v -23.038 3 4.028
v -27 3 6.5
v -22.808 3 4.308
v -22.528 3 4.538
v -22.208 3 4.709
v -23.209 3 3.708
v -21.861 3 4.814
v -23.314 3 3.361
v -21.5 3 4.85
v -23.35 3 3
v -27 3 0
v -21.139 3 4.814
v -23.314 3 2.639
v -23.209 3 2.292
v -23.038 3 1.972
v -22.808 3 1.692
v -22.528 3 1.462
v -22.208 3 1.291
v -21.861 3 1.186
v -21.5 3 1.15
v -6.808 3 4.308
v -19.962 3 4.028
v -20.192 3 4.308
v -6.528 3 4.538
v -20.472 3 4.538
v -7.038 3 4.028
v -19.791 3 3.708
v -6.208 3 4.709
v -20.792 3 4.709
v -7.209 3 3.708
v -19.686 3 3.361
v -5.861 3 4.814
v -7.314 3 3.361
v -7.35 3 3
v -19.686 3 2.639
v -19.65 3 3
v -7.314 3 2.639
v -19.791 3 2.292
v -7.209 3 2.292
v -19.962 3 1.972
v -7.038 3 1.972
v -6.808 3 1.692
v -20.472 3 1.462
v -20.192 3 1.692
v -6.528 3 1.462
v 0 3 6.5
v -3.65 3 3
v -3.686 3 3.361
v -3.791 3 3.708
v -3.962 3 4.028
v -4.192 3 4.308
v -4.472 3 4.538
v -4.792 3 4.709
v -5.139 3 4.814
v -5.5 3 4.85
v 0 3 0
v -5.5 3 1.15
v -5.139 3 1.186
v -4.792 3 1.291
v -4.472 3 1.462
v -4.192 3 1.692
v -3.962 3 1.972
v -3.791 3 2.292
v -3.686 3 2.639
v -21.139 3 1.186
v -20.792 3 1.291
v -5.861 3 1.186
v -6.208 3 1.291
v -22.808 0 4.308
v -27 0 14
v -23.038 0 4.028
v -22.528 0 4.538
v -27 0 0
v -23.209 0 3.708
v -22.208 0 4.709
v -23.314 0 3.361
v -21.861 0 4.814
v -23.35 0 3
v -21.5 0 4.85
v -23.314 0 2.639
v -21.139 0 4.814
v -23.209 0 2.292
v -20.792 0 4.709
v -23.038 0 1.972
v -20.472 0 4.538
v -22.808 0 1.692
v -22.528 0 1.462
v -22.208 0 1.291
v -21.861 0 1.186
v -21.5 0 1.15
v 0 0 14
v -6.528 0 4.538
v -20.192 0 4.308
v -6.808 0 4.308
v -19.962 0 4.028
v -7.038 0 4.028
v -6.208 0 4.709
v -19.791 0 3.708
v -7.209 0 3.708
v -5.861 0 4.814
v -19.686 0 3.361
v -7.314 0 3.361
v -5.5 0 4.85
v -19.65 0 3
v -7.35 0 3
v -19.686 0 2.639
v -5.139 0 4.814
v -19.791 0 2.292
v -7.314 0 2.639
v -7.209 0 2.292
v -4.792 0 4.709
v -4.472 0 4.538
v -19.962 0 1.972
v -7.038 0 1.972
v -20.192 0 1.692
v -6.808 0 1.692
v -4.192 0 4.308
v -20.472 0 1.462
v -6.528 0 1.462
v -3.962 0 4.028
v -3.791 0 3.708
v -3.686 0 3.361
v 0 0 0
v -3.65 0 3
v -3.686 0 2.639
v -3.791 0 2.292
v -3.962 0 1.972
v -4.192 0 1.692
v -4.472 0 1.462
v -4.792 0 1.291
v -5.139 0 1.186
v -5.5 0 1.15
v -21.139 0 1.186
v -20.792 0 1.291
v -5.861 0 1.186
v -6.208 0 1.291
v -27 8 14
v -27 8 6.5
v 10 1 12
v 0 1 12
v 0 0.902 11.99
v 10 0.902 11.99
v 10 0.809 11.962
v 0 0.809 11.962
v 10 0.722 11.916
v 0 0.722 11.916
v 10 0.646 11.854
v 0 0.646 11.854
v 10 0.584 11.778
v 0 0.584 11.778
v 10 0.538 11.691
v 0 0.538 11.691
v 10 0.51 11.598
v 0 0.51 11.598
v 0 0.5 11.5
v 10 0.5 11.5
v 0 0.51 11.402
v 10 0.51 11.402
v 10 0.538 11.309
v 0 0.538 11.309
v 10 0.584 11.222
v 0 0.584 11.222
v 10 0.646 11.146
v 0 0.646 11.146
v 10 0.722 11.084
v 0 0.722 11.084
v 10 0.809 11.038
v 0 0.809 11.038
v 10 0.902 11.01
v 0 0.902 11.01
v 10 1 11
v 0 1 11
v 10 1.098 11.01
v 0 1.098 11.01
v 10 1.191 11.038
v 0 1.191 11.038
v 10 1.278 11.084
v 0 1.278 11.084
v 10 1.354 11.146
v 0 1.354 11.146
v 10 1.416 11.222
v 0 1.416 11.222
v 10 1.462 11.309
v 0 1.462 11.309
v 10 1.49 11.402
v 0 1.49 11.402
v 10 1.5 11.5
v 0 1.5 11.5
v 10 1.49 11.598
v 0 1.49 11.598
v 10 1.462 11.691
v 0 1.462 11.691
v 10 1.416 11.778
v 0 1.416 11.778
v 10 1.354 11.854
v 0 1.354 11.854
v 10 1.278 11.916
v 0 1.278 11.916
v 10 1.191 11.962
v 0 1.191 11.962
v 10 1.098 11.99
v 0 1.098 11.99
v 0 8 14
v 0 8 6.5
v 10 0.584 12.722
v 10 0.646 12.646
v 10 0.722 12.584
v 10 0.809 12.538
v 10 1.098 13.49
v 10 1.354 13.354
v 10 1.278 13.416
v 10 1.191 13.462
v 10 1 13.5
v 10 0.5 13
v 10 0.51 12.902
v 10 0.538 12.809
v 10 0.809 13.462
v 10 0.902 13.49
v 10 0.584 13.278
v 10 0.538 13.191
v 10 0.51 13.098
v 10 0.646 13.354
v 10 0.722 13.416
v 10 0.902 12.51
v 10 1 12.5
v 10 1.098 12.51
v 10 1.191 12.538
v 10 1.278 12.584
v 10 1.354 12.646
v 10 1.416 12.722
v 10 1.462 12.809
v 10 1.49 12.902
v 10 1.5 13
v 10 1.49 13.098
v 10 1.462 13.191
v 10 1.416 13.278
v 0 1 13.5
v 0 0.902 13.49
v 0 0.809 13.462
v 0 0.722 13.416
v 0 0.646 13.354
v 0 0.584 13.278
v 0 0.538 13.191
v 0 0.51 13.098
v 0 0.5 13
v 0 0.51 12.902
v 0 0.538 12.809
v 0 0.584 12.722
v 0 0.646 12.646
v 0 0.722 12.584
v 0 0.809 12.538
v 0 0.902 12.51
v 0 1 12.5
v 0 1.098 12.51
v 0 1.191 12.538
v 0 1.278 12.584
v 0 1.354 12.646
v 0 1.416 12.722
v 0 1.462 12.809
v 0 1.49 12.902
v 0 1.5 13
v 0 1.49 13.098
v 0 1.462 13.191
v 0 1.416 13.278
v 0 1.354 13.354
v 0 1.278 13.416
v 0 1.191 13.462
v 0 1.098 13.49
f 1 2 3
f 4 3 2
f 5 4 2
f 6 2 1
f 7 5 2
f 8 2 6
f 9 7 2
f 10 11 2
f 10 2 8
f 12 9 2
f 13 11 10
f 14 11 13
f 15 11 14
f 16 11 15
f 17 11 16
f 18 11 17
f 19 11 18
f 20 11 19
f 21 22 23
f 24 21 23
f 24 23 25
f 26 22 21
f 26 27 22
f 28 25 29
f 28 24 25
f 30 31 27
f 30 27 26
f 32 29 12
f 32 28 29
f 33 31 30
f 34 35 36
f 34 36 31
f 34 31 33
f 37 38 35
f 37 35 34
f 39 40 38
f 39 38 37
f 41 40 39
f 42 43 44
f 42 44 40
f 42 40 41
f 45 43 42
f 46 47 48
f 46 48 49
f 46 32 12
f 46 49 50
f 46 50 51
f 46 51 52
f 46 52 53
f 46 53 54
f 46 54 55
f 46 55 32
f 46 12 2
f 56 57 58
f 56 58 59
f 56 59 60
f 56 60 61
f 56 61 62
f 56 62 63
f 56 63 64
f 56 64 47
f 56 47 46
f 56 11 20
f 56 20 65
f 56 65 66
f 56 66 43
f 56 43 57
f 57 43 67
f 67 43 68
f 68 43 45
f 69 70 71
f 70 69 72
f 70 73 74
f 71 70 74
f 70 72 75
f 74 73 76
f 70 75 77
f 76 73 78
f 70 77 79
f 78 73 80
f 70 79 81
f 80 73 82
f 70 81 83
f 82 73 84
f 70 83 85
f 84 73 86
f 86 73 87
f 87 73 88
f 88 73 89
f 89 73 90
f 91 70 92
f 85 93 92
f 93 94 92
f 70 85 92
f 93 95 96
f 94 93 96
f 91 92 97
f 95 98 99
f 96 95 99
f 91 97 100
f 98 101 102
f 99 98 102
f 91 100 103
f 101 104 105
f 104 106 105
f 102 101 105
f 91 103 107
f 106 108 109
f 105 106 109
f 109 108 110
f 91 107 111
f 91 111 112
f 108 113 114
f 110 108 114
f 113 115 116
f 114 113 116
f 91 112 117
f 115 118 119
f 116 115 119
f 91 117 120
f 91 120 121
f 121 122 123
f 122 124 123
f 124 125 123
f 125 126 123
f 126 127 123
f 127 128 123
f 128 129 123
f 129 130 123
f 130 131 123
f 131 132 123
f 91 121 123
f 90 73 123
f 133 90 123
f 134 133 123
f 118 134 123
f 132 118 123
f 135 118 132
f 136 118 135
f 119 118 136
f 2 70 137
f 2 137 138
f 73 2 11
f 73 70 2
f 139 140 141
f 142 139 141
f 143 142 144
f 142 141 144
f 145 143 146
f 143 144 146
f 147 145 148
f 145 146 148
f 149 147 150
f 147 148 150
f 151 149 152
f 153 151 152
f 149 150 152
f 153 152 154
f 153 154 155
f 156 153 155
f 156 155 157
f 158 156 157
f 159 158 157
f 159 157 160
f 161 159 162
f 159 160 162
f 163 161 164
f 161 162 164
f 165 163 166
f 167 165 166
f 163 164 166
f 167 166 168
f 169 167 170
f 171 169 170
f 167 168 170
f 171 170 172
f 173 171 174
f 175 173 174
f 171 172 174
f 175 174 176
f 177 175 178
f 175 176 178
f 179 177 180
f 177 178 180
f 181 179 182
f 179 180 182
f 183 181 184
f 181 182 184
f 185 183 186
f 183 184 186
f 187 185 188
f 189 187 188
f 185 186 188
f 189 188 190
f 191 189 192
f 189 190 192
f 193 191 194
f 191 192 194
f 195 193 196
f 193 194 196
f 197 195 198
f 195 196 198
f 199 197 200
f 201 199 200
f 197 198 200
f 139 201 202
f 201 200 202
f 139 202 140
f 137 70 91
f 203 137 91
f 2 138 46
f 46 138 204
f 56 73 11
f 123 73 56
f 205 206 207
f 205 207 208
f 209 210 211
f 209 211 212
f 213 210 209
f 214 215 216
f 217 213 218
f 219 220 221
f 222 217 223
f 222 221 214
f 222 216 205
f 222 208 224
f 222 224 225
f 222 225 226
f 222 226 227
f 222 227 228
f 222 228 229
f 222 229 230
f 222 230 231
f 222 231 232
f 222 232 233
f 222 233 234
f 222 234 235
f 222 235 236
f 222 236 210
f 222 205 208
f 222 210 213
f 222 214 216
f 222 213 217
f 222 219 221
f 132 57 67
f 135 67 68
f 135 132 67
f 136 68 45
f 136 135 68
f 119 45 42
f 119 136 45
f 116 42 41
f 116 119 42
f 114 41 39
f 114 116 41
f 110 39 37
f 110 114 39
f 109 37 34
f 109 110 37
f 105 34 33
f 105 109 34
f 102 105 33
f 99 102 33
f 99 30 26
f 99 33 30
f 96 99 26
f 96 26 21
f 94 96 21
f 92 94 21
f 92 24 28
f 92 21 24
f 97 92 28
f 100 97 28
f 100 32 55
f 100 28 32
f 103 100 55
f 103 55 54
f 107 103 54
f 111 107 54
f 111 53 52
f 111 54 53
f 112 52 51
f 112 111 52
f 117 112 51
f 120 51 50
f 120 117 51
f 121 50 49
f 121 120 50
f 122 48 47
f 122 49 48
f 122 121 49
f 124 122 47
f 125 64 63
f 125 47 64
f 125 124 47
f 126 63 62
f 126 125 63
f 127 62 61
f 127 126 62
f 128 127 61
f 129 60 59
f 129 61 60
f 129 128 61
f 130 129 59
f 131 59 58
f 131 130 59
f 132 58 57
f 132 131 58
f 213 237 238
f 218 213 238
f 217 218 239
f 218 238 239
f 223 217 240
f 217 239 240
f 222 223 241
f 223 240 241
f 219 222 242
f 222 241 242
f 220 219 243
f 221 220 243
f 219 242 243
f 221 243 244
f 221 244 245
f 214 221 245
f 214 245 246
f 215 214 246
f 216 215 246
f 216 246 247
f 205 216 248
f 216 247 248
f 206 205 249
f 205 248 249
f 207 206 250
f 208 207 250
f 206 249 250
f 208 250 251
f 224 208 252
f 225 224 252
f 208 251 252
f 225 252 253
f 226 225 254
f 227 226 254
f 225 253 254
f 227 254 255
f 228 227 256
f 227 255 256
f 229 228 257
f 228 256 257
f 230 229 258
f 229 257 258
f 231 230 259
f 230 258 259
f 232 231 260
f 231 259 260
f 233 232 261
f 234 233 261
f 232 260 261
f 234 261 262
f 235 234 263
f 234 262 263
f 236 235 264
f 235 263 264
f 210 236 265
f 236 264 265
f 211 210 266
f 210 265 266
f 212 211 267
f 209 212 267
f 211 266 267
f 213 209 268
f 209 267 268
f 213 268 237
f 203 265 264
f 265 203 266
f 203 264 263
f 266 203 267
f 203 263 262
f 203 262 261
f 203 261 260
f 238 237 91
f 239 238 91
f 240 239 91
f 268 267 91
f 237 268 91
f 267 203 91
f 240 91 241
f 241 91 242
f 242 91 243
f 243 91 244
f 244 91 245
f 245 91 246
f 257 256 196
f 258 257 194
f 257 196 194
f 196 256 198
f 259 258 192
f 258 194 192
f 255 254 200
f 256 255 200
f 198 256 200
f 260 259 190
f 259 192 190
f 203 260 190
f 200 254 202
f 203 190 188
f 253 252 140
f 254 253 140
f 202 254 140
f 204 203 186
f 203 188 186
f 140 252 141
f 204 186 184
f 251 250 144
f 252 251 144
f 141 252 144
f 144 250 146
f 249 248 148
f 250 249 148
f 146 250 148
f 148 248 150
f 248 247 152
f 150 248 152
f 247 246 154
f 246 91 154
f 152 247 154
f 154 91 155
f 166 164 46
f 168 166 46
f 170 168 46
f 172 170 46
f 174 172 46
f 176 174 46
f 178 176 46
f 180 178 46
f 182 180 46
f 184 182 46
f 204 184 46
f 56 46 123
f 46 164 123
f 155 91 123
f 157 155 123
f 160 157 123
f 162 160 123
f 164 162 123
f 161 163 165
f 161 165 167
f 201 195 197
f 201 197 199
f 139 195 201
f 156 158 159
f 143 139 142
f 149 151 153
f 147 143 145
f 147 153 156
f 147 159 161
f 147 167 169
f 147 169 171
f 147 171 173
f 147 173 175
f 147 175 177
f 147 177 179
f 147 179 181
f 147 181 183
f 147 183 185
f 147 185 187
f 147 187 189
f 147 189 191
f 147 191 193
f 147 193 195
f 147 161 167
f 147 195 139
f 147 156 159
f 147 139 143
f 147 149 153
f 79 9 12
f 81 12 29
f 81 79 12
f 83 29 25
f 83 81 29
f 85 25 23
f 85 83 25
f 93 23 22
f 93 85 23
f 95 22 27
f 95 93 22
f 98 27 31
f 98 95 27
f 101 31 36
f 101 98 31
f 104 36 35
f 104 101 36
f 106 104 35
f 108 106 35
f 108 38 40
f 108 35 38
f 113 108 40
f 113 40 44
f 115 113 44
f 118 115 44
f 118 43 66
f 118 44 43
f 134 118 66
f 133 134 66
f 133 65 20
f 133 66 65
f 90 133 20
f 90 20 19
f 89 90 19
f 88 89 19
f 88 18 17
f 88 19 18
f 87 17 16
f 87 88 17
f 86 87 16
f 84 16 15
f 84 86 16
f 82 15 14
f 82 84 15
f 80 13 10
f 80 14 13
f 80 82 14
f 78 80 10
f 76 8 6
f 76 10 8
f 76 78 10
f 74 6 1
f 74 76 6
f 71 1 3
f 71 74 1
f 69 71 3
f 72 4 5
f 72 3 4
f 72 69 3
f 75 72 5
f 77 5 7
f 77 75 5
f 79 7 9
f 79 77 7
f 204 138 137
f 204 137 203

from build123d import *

# Parameters (mm, degrees)
CROQUIS1_W              = 27
CROQUIS1_H              = 14
CROQUIS1_R              = 1.85
SALIENTE_EXTRUIR1_DEPTH = 8
CROQUIS2_W              = 27
CROQUIS2_H              = 6.5
CORTAR_EXTRUIR1_DEPTH   = 5
CROQUIS3_R              = 0.5
SALIENTE_EXTRUIR2_DEPTH = 10


with BuildPart() as part:
    # Croquis1 → Saliente-Extruir1 (new body)
    with BuildSketch(Plane(origin=(0, 0, 0), x_dir=(1, 0, 0), z_dir=(0, 1, 0))):
        with Locations((-13.5, -7)):
            Rectangle(CROQUIS1_W, CROQUIS1_H)
        with Locations(Location((-21.5, -3, 0), (0, 0, 270))):
            Circle(CROQUIS1_R, mode=Mode.SUBTRACT)
        with Locations(Location((-5.5, -3, 0), (0, 0, 90))):
            Circle(CROQUIS1_R, mode=Mode.SUBTRACT)
    extrude(amount=SALIENTE_EXTRUIR1_DEPTH)

    # Croquis2 → Cortar-Extruir1 (cut)
    with BuildSketch(Plane(origin=(0, 8, 0), x_dir=(1, 0, 0), z_dir=(0, 1, 0))):
        with Locations((-13.5, -3.25)):
            Rectangle(CROQUIS2_W, CROQUIS2_H)
    extrude(amount=-CORTAR_EXTRUIR1_DEPTH, mode=Mode.SUBTRACT)

    # Croquis3 → Saliente-Extruir2 (add)
    with BuildSketch(Plane(origin=(0, 0, 0), x_dir=(0, 0, -1), z_dir=(1, 0, 0))):
        with Locations(Location((-13, 1, 0), (0, 0, 180))):
            Circle(CROQUIS3_R)
        with Locations(Location((-11.5, 1, 0), (0, 0, 180))):
            Circle(CROQUIS3_R)
    extrude(amount=SALIENTE_EXTRUIR2_DEPTH)


solid = part.part
